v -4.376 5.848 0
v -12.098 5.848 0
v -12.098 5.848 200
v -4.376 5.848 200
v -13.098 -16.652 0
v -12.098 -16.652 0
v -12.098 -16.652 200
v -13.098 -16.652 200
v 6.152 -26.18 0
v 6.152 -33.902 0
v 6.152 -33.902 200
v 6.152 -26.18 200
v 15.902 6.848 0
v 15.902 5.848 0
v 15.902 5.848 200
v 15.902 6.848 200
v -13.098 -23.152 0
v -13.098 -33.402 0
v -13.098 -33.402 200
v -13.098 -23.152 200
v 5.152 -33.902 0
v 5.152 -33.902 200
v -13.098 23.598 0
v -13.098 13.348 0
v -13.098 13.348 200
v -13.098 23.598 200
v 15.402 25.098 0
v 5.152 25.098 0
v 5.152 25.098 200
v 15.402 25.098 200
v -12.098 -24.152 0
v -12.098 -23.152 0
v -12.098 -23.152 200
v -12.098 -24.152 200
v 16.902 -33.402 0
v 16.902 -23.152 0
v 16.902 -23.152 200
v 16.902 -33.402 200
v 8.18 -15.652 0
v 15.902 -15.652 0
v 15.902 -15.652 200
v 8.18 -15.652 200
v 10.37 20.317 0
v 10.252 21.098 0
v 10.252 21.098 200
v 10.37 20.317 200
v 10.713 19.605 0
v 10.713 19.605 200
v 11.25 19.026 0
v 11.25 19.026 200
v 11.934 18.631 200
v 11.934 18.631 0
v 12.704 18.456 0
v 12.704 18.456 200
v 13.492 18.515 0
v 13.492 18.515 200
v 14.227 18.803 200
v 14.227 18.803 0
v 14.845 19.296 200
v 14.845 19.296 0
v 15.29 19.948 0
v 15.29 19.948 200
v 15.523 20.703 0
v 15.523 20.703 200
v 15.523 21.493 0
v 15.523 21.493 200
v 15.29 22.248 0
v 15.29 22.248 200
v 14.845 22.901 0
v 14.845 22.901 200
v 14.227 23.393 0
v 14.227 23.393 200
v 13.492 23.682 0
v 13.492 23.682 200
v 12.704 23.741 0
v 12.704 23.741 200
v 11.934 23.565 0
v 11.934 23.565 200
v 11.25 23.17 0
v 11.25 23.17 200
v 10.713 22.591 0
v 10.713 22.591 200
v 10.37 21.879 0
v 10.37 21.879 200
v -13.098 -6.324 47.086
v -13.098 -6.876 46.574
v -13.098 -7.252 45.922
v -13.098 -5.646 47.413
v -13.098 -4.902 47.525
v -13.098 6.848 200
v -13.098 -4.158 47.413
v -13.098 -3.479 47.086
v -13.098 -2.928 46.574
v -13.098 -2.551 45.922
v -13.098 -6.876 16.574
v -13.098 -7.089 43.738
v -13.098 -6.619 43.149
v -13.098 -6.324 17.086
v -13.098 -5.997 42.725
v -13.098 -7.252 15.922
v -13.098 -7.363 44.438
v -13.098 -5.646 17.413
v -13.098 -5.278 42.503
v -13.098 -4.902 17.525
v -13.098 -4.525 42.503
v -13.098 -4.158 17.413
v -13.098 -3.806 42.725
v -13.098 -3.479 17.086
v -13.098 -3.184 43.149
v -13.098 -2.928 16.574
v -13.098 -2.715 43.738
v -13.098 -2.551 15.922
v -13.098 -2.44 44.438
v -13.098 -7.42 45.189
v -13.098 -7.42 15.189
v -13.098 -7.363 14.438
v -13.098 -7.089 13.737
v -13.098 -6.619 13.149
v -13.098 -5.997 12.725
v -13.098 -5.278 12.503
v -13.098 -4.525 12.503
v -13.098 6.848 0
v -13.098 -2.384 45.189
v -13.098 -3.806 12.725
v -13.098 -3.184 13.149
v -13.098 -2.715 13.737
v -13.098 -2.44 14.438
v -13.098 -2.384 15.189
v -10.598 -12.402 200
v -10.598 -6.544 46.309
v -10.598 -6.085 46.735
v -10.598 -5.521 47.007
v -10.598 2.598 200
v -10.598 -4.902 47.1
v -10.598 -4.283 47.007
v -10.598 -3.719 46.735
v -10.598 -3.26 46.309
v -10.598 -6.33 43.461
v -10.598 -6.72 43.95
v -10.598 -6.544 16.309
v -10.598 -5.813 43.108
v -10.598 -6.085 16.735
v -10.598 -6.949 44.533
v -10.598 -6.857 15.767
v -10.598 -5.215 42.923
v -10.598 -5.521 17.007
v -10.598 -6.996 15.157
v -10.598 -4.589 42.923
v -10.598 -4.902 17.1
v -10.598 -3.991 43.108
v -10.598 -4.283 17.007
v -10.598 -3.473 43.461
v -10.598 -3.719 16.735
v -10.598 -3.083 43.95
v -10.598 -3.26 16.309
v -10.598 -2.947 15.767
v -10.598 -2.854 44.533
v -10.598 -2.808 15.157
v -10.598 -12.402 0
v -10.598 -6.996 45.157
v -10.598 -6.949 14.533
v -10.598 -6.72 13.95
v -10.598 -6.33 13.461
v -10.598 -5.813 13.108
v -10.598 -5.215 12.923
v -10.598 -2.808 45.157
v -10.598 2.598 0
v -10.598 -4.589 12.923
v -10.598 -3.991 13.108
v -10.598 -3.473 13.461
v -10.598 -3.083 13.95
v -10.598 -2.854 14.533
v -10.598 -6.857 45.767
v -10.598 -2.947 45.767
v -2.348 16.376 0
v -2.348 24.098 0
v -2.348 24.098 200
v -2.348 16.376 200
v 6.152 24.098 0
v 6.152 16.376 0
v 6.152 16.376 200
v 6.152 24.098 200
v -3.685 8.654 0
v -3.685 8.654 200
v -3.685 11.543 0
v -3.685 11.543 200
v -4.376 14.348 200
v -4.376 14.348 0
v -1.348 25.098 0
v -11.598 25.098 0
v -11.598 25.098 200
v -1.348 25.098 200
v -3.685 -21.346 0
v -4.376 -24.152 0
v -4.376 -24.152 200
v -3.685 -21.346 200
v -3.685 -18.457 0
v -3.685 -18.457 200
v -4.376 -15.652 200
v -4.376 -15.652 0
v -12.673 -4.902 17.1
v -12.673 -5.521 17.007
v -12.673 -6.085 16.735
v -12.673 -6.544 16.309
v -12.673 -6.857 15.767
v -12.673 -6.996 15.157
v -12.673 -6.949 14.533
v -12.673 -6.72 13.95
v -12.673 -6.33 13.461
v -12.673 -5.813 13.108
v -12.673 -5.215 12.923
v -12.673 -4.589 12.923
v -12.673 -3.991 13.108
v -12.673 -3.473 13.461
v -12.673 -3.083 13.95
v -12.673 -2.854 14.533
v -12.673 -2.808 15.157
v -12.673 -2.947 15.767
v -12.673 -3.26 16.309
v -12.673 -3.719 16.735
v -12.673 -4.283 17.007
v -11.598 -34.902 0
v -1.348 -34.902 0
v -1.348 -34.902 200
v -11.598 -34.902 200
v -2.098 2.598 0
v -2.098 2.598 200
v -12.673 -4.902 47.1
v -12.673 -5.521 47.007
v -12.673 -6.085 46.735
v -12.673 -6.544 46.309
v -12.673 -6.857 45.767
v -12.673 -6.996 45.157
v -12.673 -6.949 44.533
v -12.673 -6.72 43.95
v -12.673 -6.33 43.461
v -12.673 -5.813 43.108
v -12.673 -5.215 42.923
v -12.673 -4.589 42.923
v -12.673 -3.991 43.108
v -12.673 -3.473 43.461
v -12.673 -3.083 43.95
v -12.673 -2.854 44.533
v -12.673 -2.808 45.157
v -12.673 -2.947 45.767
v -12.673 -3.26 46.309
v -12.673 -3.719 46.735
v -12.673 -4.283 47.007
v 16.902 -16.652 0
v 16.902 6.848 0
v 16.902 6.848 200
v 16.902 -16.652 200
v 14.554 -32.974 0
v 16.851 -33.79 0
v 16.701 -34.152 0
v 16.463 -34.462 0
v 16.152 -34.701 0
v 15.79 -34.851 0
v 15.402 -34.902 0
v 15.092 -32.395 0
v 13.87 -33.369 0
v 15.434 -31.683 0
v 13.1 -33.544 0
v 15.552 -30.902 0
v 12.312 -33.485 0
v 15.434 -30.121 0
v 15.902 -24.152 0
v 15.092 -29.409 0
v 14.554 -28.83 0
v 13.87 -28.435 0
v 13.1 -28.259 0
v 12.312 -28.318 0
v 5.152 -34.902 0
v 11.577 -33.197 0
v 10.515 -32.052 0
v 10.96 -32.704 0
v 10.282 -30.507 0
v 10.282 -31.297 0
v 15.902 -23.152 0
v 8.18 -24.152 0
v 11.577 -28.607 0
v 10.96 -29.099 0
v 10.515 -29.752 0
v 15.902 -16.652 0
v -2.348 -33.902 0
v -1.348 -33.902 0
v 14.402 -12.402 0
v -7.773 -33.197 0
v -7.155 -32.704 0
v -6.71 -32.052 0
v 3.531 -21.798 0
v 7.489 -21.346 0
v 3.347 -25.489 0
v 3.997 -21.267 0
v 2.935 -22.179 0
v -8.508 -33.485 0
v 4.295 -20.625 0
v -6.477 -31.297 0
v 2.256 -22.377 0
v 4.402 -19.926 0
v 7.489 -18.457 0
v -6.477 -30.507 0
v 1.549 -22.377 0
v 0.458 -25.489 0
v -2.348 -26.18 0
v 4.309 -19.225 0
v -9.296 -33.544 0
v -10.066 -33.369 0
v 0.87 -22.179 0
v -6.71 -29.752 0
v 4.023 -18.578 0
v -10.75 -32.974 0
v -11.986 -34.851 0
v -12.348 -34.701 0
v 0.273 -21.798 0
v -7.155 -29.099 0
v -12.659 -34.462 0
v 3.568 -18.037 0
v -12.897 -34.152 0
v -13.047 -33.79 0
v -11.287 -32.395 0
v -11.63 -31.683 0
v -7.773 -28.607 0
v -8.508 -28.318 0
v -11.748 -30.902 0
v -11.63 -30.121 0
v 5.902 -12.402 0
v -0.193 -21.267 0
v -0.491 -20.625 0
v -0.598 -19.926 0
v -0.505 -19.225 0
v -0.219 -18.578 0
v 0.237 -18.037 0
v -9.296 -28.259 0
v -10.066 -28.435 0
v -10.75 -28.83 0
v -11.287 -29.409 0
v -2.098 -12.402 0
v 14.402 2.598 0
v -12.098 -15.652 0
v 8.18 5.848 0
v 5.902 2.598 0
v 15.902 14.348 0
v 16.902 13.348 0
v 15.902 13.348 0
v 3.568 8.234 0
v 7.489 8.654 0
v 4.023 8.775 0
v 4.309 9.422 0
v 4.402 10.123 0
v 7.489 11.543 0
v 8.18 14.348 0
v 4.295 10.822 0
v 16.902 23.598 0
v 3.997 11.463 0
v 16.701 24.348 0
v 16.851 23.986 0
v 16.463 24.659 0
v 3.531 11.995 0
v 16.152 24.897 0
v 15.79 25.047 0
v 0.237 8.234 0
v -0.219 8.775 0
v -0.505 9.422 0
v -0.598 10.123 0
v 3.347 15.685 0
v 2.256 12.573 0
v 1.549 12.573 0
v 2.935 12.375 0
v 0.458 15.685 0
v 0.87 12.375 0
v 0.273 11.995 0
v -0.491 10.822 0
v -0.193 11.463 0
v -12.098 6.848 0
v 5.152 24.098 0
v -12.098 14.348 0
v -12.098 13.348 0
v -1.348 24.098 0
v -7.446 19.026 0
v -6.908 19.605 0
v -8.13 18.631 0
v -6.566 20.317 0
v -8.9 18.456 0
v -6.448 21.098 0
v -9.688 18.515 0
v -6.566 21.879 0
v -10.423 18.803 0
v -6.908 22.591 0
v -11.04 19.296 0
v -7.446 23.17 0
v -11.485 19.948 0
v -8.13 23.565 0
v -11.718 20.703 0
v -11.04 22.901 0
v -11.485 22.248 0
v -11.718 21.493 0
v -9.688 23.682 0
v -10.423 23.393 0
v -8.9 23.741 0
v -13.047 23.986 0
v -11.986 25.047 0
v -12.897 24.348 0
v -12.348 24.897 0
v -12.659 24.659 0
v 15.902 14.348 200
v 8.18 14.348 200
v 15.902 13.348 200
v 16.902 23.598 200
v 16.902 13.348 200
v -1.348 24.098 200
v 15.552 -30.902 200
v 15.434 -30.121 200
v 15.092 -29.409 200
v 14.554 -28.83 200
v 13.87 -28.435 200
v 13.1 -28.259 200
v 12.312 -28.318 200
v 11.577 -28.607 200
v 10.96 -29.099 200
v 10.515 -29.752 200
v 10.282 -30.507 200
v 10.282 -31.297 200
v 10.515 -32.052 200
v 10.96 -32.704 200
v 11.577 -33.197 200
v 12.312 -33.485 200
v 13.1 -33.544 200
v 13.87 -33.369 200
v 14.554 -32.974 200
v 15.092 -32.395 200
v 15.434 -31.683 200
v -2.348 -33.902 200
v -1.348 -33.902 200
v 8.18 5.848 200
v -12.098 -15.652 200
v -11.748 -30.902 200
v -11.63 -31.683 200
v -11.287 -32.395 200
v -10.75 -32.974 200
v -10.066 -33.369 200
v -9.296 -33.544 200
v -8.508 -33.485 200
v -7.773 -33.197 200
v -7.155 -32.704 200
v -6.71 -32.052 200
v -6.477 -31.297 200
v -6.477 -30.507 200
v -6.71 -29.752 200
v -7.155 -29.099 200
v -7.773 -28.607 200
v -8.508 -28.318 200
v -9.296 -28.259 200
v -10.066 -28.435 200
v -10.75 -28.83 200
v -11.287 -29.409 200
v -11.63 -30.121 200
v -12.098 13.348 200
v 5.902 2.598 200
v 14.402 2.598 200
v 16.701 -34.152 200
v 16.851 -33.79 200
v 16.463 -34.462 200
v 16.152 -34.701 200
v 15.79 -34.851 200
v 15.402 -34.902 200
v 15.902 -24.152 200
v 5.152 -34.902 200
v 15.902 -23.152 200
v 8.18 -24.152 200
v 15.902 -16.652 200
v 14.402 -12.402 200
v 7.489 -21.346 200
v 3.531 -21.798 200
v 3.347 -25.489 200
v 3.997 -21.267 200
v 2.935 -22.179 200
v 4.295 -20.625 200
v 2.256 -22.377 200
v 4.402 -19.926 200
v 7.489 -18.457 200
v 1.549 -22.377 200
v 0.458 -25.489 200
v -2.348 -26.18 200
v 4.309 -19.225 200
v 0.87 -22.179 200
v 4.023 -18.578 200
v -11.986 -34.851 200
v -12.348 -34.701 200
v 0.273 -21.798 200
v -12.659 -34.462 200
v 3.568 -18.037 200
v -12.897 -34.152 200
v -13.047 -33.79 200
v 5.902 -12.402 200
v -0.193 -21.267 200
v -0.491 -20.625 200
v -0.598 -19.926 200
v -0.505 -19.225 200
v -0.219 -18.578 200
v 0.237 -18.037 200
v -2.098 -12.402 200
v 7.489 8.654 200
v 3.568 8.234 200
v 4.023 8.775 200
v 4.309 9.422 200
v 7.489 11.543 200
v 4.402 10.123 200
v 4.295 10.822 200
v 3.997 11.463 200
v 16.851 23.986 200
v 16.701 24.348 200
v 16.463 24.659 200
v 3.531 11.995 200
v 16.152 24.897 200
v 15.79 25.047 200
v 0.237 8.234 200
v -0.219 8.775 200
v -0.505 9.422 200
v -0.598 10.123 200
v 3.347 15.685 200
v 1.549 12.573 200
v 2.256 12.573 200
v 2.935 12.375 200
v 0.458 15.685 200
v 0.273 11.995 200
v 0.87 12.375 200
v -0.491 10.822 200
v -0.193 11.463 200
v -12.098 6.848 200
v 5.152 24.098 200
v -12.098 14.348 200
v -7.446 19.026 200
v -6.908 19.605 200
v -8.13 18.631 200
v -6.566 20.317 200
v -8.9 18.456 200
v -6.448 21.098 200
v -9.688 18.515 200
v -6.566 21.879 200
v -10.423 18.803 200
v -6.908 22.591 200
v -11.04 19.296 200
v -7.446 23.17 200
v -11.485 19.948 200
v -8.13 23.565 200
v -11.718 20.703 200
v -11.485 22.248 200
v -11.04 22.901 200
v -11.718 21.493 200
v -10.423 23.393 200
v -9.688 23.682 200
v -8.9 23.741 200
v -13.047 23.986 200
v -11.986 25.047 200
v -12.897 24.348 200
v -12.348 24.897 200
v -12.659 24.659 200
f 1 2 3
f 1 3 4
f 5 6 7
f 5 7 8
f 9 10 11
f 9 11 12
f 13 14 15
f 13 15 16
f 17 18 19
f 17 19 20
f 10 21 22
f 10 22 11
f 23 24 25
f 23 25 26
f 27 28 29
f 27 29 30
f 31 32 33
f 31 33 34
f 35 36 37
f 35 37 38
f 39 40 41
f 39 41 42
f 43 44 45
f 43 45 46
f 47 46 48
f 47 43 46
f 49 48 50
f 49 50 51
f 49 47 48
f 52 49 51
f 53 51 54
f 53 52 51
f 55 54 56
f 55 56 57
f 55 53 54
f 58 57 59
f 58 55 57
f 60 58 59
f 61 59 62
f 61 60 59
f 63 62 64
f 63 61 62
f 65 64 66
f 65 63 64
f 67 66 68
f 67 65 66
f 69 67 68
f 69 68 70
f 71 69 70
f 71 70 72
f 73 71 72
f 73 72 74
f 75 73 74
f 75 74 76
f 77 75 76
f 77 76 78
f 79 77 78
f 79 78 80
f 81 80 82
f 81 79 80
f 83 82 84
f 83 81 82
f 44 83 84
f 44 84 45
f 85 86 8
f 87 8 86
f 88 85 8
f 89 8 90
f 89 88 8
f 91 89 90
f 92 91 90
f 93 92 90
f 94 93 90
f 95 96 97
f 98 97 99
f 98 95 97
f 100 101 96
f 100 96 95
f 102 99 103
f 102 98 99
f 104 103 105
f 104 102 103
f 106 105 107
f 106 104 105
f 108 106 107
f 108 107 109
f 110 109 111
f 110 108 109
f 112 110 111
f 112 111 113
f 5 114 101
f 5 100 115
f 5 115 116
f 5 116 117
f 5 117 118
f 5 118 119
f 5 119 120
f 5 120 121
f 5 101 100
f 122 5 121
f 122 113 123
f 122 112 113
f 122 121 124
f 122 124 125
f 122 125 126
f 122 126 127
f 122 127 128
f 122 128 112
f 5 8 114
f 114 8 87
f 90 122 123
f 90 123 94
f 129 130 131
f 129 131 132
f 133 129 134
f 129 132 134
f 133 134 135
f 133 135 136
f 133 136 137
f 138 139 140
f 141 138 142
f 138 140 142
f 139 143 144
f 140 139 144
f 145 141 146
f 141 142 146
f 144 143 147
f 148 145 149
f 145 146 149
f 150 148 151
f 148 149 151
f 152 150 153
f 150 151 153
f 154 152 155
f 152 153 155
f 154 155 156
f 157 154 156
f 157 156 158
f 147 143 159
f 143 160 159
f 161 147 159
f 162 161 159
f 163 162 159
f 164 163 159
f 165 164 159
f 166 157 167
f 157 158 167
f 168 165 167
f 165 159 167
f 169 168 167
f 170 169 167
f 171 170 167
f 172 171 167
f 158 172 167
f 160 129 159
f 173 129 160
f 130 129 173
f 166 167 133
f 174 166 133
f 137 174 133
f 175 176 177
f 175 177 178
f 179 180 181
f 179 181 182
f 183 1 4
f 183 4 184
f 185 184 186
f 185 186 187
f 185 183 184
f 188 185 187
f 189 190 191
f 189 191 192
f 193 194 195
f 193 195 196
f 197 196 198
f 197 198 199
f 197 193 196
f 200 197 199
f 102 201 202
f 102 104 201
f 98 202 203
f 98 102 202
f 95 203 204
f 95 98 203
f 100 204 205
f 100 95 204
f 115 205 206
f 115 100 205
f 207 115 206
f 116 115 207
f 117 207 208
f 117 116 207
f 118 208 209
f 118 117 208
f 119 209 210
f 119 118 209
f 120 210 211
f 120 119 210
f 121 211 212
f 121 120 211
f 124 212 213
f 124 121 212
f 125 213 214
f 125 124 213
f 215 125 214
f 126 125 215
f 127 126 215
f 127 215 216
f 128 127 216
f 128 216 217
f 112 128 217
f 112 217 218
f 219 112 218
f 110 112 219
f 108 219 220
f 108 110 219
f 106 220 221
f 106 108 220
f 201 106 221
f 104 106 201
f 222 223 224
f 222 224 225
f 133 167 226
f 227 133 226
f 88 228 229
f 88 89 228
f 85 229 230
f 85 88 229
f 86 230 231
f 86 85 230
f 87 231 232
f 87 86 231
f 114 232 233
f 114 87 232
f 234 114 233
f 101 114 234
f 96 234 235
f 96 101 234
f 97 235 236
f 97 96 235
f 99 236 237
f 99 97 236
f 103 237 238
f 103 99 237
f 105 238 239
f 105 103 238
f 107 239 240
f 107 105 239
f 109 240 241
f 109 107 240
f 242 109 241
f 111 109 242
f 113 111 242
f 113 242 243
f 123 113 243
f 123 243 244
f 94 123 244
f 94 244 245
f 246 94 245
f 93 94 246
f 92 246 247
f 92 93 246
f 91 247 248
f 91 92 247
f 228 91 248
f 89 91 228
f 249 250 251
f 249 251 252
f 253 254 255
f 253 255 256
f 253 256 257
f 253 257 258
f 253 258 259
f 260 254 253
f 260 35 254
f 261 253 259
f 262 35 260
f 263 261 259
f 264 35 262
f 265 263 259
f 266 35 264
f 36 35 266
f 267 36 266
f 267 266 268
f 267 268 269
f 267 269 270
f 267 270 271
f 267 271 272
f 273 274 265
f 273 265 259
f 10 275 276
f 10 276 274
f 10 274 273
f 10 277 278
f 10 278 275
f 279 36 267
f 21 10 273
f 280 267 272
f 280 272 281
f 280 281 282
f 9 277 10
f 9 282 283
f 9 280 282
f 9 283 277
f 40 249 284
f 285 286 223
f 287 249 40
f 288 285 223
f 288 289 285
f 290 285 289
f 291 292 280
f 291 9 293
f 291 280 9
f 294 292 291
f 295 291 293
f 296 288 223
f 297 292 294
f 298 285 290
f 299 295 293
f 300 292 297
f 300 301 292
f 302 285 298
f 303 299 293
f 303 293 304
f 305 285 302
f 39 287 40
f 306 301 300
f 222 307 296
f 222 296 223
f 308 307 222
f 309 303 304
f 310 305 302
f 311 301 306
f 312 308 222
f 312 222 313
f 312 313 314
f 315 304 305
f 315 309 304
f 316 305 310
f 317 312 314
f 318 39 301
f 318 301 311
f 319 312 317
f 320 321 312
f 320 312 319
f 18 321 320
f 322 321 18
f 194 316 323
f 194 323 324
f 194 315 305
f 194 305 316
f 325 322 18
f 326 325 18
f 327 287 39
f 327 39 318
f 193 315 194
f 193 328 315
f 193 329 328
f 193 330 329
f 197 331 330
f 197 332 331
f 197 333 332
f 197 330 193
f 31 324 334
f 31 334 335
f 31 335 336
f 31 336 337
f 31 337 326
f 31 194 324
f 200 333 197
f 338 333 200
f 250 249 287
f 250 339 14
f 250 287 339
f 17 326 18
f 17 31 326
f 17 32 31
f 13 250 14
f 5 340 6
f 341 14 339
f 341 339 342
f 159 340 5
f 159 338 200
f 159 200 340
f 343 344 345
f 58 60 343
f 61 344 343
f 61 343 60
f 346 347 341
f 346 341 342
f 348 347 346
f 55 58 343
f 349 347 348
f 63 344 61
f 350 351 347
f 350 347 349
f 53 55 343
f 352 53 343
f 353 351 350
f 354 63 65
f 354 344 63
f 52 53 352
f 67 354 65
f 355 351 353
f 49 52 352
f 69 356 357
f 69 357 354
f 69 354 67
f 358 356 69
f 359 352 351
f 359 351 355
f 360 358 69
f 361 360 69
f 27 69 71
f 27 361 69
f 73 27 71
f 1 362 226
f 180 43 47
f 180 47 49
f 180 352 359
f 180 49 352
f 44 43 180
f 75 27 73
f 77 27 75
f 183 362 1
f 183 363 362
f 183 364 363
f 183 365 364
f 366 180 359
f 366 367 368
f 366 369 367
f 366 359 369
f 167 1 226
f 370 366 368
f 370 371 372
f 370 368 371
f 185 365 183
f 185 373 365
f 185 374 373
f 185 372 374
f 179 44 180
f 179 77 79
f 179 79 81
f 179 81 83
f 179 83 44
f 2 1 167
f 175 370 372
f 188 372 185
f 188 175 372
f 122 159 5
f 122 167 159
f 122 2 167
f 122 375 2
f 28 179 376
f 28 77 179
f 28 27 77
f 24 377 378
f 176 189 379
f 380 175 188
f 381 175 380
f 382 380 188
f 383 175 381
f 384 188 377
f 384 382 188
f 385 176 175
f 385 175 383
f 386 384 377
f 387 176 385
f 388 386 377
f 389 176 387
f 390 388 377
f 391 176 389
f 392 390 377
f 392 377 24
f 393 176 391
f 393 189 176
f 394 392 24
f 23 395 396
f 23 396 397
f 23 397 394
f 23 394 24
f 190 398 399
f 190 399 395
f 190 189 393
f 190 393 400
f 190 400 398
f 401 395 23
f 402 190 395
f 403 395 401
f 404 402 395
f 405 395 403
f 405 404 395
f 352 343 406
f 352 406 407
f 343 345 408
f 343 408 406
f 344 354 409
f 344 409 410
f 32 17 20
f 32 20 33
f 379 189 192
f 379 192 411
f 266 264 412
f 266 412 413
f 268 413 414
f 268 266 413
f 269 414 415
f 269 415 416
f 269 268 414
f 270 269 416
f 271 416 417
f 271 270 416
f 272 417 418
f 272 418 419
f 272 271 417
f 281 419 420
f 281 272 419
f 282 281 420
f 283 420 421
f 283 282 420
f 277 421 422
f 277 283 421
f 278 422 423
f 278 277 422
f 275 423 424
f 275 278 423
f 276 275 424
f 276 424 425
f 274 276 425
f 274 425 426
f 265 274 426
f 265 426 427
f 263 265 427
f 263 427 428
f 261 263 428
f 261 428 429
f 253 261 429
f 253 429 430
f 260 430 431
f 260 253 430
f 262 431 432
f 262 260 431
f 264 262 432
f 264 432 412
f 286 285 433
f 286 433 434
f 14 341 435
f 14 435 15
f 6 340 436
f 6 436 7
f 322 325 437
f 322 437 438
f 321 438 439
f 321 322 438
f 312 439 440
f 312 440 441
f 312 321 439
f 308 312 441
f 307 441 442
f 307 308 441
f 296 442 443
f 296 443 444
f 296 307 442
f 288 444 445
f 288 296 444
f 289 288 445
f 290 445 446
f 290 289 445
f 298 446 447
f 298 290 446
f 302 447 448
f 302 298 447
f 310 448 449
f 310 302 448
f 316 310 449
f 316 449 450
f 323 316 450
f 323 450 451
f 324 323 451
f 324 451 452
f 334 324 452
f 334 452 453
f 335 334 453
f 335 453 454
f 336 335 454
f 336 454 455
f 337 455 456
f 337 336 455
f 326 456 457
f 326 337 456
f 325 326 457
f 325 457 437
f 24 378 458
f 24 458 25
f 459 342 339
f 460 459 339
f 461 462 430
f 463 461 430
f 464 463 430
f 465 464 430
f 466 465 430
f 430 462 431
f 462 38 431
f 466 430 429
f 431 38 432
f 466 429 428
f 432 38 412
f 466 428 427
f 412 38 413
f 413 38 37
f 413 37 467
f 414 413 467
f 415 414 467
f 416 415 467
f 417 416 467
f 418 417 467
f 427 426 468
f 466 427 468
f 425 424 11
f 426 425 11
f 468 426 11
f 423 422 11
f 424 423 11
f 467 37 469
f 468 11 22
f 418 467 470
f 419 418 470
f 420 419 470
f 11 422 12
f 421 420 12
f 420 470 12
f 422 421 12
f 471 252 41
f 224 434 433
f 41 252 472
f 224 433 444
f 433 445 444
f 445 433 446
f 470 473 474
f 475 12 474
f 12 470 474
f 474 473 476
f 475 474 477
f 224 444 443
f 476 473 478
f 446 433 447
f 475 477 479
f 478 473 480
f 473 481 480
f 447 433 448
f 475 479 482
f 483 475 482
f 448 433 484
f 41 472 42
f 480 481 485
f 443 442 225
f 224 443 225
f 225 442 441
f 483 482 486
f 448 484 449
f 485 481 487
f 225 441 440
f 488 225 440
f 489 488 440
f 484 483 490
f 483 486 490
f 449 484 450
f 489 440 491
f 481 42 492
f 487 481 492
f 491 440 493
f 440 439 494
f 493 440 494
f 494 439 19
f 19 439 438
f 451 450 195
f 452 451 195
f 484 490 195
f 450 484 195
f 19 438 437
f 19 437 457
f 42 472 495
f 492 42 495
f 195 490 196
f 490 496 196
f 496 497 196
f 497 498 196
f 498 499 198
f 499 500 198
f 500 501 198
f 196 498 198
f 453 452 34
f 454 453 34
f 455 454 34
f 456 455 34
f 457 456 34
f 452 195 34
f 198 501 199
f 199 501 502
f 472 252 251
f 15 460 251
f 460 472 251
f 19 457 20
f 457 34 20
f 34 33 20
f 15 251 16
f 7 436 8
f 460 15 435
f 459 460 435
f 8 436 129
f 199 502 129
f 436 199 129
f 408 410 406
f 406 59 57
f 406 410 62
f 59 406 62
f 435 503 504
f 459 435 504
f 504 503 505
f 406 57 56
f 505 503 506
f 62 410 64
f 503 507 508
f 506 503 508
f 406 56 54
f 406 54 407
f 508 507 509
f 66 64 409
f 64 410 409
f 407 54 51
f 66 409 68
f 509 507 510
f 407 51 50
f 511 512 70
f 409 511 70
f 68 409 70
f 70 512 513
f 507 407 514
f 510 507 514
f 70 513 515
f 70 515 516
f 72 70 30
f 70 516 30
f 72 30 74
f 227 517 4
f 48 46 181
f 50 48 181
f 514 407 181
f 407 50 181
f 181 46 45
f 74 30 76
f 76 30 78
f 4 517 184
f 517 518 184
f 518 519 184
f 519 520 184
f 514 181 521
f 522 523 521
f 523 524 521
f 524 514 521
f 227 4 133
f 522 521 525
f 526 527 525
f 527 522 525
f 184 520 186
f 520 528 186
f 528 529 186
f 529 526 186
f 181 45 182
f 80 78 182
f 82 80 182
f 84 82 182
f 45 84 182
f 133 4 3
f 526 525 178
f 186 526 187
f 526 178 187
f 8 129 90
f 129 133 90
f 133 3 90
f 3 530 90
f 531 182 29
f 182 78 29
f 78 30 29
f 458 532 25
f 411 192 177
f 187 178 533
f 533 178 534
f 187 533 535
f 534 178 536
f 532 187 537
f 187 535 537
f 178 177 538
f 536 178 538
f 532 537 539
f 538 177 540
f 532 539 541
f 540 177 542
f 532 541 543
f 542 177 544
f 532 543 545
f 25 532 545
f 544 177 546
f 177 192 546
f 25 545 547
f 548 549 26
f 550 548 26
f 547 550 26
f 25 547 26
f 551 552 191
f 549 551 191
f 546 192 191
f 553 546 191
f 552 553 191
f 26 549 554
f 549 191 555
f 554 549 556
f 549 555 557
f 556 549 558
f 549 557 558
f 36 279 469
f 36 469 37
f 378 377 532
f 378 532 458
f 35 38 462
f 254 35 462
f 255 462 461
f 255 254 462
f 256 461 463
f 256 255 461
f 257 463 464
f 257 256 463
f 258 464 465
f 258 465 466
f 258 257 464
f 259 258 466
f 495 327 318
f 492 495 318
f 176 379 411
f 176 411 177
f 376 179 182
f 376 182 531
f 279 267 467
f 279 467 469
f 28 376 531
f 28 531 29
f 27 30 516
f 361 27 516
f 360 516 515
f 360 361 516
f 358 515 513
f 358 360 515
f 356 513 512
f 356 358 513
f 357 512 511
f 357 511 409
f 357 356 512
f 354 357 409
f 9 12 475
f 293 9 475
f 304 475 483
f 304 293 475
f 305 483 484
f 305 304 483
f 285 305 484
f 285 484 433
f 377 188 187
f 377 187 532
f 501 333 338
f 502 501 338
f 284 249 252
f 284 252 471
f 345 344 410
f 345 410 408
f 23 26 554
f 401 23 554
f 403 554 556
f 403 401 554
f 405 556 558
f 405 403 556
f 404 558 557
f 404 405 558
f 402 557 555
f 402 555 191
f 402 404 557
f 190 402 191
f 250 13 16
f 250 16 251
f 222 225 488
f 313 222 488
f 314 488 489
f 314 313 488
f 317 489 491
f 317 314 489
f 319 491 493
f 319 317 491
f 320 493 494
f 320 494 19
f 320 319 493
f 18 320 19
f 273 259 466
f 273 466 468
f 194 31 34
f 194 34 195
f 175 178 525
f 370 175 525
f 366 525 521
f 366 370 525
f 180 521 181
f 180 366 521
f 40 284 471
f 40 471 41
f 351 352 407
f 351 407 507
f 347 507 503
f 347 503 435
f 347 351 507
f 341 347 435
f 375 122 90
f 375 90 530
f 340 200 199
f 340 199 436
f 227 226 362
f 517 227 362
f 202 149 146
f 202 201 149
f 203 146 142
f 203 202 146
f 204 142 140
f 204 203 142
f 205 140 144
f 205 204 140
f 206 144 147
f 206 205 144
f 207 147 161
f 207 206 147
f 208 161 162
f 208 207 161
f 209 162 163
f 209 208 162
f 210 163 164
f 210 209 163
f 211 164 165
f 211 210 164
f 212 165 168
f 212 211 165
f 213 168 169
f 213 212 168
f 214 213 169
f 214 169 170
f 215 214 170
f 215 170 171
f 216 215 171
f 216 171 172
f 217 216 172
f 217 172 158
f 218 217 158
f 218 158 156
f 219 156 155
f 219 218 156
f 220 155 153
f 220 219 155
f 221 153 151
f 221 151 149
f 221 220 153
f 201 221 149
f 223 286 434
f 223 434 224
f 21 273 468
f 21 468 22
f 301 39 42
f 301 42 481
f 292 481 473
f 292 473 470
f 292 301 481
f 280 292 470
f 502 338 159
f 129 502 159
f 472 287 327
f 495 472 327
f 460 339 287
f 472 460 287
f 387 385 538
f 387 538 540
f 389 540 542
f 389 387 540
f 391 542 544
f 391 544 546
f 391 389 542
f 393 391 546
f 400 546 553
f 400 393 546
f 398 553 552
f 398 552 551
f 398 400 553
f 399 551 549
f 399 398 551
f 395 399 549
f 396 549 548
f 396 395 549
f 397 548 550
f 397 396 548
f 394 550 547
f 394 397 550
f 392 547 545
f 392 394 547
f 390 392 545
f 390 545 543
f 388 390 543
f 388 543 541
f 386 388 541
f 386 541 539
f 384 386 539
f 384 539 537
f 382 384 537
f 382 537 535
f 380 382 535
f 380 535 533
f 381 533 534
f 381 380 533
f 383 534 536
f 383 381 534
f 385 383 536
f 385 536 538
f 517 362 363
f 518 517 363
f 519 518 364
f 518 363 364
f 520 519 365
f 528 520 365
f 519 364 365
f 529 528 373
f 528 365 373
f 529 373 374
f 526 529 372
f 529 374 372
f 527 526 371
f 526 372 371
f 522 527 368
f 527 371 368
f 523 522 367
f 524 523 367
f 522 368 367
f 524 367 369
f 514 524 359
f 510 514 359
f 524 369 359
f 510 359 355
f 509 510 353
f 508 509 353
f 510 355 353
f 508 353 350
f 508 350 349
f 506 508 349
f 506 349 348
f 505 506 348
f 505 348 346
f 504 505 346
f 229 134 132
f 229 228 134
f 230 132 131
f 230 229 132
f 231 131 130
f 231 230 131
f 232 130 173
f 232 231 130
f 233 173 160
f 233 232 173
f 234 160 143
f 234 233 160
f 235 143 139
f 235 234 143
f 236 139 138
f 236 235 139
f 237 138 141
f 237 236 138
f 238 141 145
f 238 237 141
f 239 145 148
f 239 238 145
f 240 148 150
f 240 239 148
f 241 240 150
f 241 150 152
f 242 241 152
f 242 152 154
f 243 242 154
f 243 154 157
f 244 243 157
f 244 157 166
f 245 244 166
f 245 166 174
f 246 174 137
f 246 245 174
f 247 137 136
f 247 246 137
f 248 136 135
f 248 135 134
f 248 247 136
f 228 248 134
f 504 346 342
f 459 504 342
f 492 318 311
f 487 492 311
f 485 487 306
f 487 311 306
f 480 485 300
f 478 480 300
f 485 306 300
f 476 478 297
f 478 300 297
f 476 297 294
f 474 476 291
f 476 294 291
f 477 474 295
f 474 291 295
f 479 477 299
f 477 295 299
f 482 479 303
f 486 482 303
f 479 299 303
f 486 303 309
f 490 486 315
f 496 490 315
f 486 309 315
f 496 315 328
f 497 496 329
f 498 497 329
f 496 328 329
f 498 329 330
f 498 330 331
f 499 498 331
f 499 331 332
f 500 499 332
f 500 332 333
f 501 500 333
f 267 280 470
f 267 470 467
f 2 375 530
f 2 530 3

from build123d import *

# Parameters (mm, degrees)
SKETCH1_2_R                 = 2.65
EXTRUDE_1_DEPTH             = 200
HOLE_WIZARD_M5_1_AT_2_COUNT = 2
HOLE_WIZARD_M5_1_AT_2_PITCH = 30


# Read off the part's stored shape, not the designer's step: 30 x 60G x R1.5<1>
with BuildPart() as part:
    # Sketch1<2> → 凸台-拉伸1 (new body)
    with BuildSketch(Plane(origin=(1.902137601, -4.901792835, 0), x_dir=(1, 0, 0), z_dir=(0, 0, 1))):
        with BuildLine():
            Line((-3.25, 30), (-3.25, 29))
            Line((-3.25, 29), (-4.25, 29))
            Line((-4.25, 29), (-4.25, 21.277812156))
            ThreePointArc((-4.25, 21.277812156), (0, 20.5), (4.25, 21.277812156))
            Line((4.25, 21.277812156), (4.25, 29))
            Line((4.25, 29), (3.25, 29))
            Line((3.25, 29), (3.25, 30))
            Line((3.25, 30), (13.5, 30))
            ThreePointArc((13.5, 30), (14.560660172, 29.560660172), (15, 28.5))
            Line((15, 28.5), (15, 18.25))
            Line((15, 18.25), (14, 18.25))
            Line((14, 18.25), (14, 19.25))
            Line((14, 19.25), (6.277812156, 19.25))
            ThreePointArc((6.277812156, 19.25), (5.5, 15), (6.277812156, 10.75))
            Line((6.277812156, 10.75), (14, 10.75))
            Line((14, 10.75), (14, 11.75))
            Line((14, 11.75), (15, 11.75))
            Line((15, 11.75), (15, -11.75))
            Line((15, -11.75), (14, -11.75))
            Line((14, -11.75), (14, -10.75))
            Line((14, -10.75), (6.277812156, -10.75))
            ThreePointArc((6.277812156, -10.75), (5.5, -15), (6.277812156, -19.25))
            Line((6.277812156, -19.25), (14, -19.25))
            Line((14, -19.25), (14, -18.25))
            Line((14, -18.25), (15, -18.25))
            Line((15, -18.25), (15, -28.5))
            ThreePointArc((15, -28.5), (14.560660172, -29.560660172), (13.5, -30))
            Line((13.5, -30), (3.25, -30))
            Line((3.25, -30), (3.25, -29))
            Line((3.25, -29), (4.25, -29))
            Line((4.25, -29), (4.25, -21.277812156))
            ThreePointArc((4.25, -21.277812156), (0, -20.5), (-4.25, -21.277812156))
            Line((-4.25, -21.277812156), (-4.25, -29))
            Line((-4.25, -29), (-3.25, -29))
            Line((-3.25, -29), (-3.25, -30))
            Line((-3.25, -30), (-13.5, -30))
            ThreePointArc((-13.5, -30), (-14.560660172, -29.560660172), (-15, -28.5))
            Line((-15, -28.5), (-15, -18.25))
            Line((-15, -18.25), (-14, -18.25))
            Line((-14, -18.25), (-14, -19.25))
            Line((-14, -19.25), (-6.277812156, -19.25))
            ThreePointArc((-6.277812156, -19.25), (-5.5, -15), (-6.277812156, -10.75))
            Line((-6.277812156, -10.75), (-14, -10.75))
            Line((-14, -10.75), (-14, -11.75))
            Line((-14, -11.75), (-15, -11.75))
            Line((-15, -11.75), (-15, 11.75))
            Line((-15, 11.75), (-14, 11.75))
            Line((-14, 11.75), (-14, 10.75))
            Line((-14, 10.75), (-6.277812156, 10.75))
            ThreePointArc((-6.277812156, 10.75), (-5.5, 15), (-6.277812156, 19.25))
            Line((-6.277812156, 19.25), (-14, 19.25))
            Line((-14, 19.25), (-14, 18.25))
            Line((-14, 18.25), (-15, 18.25))
            Line((-15, 18.25), (-15, 28.5))
            ThreePointArc((-15, 28.5), (-14.560660172, 29.560660172), (-13.5, 30))
            Line((-13.5, 30), (-3.25, 30))
        make_face()
        with Locations((-11, 26)):
            Circle(SKETCH1_2_R, mode=Mode.SUBTRACT)
        with Locations(Location((11, 26, 0), (0, 0, 180))):
            Circle(SKETCH1_2_R, mode=Mode.SUBTRACT)
        with Locations((11, -26)):
            Circle(SKETCH1_2_R, mode=Mode.SUBTRACT)
        with Locations(Location((-11, -26, 0), (0, 0, 180))):
            Circle(SKETCH1_2_R, mode=Mode.SUBTRACT)
        with BuildLine():
            Line((-12.5, 7.5), (-4, 7.5))
            Line((-4, 7.5), (-1.665625283, 13.135679101))
            ThreePointArc((-1.665625283, 13.135679101), (0, 17.5), (1.665625283, 13.135679101))
            Line((1.665625283, 13.135679101), (4, 7.5))
            Line((4, 7.5), (12.5, 7.5))
            Line((12.5, 7.5), (12.5, -7.5))
            Line((12.5, -7.5), (4, -7.5))
            Line((4, -7.5), (1.665625283, -13.135679101))
            ThreePointArc((1.665625283, -13.135679101), (0, -17.5), (-1.665625283, -13.135679101))
            Line((-1.665625283, -13.135679101), (-4, -7.5))
            Line((-4, -7.5), (-12.5, -7.5))
            Line((-12.5, -7.5), (-12.5, 7.5))
        make_face(mode=Mode.SUBTRACT)
    extrude(amount=EXTRUDE_1_DEPTH)

    # 草图4 → M5 螺纹孔1 (revolve, cut)
    with BuildSketch(Plane(origin=(-13.097862399, -4.901792835, 45), x_dir=(0, 0, 1), z_dir=(0, 1, 0))):
        Polygon((0, 0), (0, 2.5), (2.1, 2.5), (2.1, 0.425), (2.525, 0), align=None)
    hole_wizard_m5_1 = revolve(axis=Axis((-19.447862399, -4.901792835, 45), (1, 0, 0)), mode=Mode.SUBTRACT)

    # M5 螺纹孔1 at 2: M5 螺纹孔1 ×2
    with Locations(*[(0, 0, -i * HOLE_WIZARD_M5_1_AT_2_PITCH) for i in range(1, HOLE_WIZARD_M5_1_AT_2_COUNT)]):
        add(hole_wizard_m5_1, mode=Mode.SUBTRACT)


solid = part.part
